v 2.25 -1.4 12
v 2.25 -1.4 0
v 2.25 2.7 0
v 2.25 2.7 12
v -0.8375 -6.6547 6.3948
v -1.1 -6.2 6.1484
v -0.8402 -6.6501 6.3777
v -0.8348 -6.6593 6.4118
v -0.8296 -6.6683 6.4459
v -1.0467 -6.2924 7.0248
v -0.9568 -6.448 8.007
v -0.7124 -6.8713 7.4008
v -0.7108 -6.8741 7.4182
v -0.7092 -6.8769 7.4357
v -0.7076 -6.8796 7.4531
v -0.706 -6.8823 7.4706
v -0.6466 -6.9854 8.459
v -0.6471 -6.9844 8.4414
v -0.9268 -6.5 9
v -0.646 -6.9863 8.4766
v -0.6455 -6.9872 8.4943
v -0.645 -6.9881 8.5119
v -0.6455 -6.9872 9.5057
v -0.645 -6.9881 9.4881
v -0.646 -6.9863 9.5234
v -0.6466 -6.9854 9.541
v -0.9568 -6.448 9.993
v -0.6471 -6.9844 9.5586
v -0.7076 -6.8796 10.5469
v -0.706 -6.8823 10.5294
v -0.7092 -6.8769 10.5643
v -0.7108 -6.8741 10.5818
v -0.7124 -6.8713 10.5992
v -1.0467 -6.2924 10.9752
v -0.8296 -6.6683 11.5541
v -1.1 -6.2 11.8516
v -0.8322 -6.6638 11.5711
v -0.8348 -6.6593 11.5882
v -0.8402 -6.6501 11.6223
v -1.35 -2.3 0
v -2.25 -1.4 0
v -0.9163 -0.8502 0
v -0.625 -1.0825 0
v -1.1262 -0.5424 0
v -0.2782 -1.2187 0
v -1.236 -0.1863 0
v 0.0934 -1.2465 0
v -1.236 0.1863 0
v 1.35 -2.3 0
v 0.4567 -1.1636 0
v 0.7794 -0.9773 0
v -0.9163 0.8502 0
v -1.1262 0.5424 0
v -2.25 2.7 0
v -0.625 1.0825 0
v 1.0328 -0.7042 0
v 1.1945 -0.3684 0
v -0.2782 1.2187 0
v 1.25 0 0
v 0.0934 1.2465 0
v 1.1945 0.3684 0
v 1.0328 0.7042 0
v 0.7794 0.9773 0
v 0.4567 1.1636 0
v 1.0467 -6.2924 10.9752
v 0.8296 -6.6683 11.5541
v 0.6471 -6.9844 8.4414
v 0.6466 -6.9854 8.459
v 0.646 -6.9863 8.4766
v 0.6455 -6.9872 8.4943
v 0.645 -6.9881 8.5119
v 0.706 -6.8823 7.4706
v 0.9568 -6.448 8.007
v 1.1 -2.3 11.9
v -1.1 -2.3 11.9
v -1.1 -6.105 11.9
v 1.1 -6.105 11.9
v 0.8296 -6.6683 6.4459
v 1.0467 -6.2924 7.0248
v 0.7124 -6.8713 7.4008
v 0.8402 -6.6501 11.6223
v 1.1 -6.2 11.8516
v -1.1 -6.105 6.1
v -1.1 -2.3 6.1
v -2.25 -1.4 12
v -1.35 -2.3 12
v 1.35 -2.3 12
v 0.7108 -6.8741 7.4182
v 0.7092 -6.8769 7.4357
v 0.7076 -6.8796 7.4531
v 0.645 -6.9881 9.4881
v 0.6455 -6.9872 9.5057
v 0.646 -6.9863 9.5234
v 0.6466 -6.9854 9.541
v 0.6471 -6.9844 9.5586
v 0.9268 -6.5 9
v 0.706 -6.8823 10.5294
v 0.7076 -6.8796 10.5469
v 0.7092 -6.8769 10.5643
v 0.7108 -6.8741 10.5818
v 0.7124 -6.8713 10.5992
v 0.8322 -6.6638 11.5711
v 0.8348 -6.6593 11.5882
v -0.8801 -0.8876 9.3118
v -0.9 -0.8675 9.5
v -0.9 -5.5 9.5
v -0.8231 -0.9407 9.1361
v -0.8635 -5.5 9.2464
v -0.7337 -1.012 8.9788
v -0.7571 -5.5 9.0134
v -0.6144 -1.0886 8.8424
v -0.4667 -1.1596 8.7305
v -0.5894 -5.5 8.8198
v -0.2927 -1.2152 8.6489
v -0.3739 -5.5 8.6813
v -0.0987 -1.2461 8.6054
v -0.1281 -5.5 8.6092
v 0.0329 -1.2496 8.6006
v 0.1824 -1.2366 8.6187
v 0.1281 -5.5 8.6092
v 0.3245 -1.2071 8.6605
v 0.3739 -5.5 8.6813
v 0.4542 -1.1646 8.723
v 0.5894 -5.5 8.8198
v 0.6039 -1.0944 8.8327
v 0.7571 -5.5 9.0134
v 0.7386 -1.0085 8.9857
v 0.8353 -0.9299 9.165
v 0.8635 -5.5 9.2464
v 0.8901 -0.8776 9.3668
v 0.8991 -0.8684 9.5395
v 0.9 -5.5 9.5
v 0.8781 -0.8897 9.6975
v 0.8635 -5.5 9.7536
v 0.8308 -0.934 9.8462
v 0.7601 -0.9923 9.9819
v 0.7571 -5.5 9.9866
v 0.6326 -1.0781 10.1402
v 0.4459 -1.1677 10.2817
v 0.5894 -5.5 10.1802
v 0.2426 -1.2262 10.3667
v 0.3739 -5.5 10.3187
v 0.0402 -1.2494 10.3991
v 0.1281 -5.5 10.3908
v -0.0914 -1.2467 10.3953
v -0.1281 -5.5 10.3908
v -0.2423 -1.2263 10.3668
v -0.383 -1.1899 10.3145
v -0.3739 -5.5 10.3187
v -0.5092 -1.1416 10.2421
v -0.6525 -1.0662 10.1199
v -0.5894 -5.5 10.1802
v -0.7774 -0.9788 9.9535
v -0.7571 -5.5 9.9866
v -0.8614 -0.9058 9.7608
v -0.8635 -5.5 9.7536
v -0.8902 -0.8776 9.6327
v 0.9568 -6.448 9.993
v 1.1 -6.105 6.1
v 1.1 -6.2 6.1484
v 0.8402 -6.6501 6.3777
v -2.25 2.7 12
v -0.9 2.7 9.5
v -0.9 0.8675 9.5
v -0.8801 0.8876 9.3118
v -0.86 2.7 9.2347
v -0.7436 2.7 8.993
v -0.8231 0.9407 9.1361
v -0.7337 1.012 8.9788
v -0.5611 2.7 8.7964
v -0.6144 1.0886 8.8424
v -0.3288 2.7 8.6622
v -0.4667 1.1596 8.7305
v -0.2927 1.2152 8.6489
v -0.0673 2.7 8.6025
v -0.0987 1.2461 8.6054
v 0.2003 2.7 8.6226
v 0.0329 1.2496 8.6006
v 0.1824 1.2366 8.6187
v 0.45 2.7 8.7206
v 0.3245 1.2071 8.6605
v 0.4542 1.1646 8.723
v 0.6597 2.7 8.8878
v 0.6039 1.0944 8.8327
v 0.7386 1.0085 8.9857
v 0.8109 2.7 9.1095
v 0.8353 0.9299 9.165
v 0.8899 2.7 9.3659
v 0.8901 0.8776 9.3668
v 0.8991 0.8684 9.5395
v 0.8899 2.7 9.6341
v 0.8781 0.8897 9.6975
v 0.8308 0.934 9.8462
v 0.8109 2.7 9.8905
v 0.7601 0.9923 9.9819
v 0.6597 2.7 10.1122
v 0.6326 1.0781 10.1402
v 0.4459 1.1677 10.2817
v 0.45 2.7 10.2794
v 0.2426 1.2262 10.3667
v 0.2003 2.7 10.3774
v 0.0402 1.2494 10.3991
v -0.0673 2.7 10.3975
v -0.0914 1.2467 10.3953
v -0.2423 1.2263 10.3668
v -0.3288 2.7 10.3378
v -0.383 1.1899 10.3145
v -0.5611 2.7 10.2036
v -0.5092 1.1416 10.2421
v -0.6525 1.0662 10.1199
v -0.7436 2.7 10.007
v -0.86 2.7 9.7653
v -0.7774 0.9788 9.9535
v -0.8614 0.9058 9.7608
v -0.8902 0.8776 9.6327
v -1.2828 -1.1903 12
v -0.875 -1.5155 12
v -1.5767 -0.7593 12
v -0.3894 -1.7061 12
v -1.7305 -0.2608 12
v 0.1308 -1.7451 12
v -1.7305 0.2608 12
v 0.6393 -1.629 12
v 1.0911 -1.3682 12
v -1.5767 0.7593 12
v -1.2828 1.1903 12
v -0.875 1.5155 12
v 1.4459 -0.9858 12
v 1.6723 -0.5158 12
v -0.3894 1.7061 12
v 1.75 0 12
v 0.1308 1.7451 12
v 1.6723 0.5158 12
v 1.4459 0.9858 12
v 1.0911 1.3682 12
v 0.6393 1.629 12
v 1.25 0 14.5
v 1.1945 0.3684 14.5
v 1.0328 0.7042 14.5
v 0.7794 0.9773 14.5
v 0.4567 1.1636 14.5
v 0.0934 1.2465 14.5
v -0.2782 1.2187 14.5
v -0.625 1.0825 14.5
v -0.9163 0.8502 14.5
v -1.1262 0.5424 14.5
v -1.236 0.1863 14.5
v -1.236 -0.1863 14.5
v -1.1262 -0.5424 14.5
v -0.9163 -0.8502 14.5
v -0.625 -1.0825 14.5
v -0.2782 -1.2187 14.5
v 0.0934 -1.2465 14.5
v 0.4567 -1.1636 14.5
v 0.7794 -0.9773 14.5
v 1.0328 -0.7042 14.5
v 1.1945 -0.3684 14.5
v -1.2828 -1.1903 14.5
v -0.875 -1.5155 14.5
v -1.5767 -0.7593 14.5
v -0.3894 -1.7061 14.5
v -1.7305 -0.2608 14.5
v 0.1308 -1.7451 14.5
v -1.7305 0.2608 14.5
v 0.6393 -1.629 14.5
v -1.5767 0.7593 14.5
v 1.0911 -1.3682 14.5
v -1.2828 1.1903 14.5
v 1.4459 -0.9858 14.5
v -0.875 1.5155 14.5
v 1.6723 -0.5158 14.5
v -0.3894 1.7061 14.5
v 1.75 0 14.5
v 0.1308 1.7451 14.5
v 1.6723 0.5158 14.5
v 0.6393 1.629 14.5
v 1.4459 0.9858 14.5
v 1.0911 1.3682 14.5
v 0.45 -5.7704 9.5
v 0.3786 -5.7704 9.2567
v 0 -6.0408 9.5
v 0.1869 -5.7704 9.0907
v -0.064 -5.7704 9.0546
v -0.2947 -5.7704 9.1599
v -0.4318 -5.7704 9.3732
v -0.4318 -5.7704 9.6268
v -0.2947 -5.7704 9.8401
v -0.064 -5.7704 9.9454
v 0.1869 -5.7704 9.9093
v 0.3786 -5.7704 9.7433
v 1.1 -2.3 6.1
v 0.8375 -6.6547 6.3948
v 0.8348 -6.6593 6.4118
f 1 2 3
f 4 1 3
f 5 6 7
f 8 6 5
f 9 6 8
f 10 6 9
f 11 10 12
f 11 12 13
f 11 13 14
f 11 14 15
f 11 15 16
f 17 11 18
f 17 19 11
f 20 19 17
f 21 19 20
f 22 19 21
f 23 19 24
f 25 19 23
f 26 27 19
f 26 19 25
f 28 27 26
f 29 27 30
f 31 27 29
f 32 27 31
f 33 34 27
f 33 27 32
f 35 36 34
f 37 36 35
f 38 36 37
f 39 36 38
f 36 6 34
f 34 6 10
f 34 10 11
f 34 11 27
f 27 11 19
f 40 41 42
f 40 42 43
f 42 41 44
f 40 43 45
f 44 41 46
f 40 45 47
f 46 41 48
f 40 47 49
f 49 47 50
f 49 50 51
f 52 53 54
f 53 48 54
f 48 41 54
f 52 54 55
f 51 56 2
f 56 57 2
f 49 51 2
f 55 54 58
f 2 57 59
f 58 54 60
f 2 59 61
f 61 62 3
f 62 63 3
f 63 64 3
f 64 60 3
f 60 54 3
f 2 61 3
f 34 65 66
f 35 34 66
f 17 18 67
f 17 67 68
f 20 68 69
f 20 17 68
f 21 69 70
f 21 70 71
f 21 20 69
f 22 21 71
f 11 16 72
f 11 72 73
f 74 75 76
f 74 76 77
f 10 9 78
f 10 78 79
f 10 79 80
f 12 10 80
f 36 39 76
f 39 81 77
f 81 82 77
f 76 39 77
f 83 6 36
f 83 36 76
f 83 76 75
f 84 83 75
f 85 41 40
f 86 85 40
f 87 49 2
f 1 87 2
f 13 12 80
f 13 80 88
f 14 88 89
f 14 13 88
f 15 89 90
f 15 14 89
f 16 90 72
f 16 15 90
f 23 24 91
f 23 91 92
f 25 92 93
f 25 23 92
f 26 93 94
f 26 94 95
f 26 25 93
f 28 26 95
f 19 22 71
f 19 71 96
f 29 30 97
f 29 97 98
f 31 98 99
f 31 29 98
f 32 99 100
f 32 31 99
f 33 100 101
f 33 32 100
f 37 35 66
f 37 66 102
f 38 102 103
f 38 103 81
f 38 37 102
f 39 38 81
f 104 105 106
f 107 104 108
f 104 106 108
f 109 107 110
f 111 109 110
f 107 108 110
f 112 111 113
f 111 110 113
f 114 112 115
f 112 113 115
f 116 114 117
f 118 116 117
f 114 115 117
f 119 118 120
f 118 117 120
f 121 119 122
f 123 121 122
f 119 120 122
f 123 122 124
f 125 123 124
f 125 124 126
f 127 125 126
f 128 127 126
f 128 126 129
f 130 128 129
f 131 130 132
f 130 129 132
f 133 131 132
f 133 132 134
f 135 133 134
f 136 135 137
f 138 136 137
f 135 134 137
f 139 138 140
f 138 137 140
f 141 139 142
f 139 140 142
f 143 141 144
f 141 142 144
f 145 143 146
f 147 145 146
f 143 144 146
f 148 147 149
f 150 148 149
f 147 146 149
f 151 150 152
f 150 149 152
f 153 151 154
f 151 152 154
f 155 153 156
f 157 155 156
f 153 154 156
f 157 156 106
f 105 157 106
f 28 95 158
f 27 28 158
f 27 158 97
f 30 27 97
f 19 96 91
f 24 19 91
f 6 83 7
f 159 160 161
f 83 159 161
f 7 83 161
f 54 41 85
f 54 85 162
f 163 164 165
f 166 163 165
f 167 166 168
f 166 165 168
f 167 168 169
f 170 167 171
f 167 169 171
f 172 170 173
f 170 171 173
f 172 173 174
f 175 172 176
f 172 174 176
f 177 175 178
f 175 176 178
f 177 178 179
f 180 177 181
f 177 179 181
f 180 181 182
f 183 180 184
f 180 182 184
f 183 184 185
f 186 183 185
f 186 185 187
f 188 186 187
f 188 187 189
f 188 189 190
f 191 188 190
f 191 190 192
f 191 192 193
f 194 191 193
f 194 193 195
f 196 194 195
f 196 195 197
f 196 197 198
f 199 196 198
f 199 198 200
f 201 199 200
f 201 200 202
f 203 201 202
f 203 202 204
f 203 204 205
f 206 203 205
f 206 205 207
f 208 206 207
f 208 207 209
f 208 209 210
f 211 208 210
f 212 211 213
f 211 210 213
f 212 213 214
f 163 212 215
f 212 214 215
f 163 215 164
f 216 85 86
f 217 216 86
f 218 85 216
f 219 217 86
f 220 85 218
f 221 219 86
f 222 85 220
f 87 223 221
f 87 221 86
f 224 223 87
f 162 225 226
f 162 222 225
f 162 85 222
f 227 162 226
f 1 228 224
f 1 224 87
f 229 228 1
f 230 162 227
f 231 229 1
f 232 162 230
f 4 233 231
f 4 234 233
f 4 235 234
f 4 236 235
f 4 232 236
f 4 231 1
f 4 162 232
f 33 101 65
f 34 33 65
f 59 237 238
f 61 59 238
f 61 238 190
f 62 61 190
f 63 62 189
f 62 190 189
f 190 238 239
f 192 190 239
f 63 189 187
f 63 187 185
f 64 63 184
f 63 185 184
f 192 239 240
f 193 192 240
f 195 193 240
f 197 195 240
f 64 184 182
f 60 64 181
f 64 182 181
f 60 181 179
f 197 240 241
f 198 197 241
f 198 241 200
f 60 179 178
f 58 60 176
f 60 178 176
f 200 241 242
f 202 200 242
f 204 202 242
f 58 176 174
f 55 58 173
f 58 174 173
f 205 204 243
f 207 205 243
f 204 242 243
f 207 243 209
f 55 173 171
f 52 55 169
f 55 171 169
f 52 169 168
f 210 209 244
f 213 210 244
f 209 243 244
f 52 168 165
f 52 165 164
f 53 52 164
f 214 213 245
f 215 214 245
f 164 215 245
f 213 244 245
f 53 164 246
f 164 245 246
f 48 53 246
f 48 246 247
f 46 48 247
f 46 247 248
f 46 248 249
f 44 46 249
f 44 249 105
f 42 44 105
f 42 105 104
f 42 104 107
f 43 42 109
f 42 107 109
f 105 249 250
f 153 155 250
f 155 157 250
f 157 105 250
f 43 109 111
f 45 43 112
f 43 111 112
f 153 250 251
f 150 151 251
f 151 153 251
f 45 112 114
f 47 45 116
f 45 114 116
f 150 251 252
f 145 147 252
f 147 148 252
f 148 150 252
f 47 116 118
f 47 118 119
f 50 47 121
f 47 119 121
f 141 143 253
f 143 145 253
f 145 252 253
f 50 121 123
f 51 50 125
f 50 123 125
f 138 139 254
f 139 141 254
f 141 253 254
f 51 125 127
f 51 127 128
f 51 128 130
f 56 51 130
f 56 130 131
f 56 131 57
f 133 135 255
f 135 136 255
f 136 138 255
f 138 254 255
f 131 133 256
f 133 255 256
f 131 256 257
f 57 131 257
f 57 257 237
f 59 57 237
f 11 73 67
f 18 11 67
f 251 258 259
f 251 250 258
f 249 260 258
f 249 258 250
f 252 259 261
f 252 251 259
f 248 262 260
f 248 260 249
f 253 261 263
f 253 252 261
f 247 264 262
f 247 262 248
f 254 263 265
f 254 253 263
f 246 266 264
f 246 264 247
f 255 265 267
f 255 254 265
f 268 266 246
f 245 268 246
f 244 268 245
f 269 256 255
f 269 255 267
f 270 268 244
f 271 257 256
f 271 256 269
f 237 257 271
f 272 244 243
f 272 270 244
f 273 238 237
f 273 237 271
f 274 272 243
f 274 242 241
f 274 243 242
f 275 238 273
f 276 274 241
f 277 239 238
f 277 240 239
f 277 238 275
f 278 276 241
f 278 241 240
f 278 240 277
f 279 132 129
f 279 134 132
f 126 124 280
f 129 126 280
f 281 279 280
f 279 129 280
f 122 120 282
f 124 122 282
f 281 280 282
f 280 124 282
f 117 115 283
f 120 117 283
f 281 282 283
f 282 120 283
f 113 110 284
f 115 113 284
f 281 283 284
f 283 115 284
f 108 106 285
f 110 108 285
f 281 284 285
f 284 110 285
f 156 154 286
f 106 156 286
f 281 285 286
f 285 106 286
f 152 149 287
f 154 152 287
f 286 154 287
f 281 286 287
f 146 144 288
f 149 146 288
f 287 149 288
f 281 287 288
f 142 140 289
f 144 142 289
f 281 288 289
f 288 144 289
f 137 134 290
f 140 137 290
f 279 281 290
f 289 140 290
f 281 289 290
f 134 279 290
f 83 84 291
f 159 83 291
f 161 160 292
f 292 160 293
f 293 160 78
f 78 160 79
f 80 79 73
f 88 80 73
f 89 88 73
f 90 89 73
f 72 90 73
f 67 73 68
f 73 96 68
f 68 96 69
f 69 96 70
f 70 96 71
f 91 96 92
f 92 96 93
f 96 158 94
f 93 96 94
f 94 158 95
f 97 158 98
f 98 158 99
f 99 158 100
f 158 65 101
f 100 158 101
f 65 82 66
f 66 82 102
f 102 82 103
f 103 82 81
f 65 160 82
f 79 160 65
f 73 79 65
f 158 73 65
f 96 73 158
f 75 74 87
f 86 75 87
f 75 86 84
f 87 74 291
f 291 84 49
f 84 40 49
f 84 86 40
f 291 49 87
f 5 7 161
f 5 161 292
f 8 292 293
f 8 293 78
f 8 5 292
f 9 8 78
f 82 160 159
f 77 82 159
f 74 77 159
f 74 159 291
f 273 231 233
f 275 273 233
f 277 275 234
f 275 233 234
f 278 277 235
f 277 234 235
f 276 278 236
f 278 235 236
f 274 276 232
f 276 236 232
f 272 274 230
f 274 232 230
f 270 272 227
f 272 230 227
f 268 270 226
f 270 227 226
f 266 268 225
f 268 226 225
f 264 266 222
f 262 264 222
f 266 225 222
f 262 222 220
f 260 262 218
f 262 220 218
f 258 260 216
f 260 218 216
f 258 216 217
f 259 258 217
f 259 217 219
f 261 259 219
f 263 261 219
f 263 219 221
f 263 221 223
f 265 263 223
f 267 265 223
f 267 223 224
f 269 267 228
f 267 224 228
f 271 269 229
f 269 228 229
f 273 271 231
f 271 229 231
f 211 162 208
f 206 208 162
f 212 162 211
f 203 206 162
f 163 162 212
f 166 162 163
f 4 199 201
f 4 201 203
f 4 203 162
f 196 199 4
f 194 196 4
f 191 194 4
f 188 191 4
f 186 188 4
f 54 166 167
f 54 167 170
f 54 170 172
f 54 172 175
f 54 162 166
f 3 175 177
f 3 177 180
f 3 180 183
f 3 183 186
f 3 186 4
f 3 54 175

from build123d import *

# Parameters (mm, degrees)
SKETCH1_W                      = 4.5
SKETCH1_H                      = 5
BOSS_EXTRUDE1_DEPTH            = 12
SKETCH4_R                      = 1.75
BOSS_EXTRUDE3_DEPTH            = 2.5
SKETCH5_R                      = 1.25
CUT_EXTRUDE1_DEPTH             = 15.5
SKETCH7_W                      = 2.2
SKETCH7_H                      = 4.7
BOSS_EXTRUDE4_DEPTH            = 5.8
CUT_EXTRUDE2_DEPTH             = 13
CUT_EXTRUDE6_DEPTH             = 12.9
CUT_EXTRUDE3_DEPTH             = 3.25
CUT_EXTRUDE3_DEPTH_BACK        = 3.25
CUT_EXTRUDE4_DEPTH             = 3.25
CIRPATTERN3_COUNT              = 60
F_1_8_1_8_DIAMETER_HOLE1_D     = 1.8
F_1_8_1_8_DIAMETER_HOLE1_DEPTH = 8.2
F_1_8_1_8_DIAMETER_HOLE1_TIP   = 0.540774557


with BuildPart() as part:
    # Sketch1 → Boss-Extrude1 (new body)
    with BuildSketch(Plane.XY):
        with Locations((0, 0.2)):
            Rectangle(SKETCH1_W, SKETCH1_H)
    extrude(amount=BOSS_EXTRUDE1_DEPTH)

    # Sketch4 → Boss-Extrude3 (add)
    with BuildSketch(Plane.XY.offset(12)):
        Circle(SKETCH4_R)
    extrude(amount=BOSS_EXTRUDE3_DEPTH)

    # Sketch5 → Cut-Extrude1 (cut, through all)
    with BuildSketch(Plane.XY.offset(14.5)):
        Circle(SKETCH5_R)
    extrude(amount=-CUT_EXTRUDE1_DEPTH, mode=Mode.SUBTRACT)

    # Sketch7 → Boss-Extrude4 (add)
    with BuildSketch(Plane.XY.offset(6.1)):
        with Locations((0, -4.65)):
            Rectangle(SKETCH7_W, SKETCH7_H)
    extrude(amount=BOSS_EXTRUDE4_DEPTH)

    # Sketch8 → Cut-Extrude2 (cut, through all)
    with BuildSketch(Plane.XY.offset(12)):
        Polygon((1.35, -2.3), (2.25, -1.4), (2.25, -2.3), align=None)
        Polygon((-1.35, -2.3), (-2.25, -2.3), (-2.25, -1.4), align=None)
    extrude(amount=-CUT_EXTRUDE2_DEPTH, mode=Mode.SUBTRACT)

    # Sketch10 → Cut-Extrude6 (cut, through all)
    with BuildSketch(Plane.XY.offset(11.9)):
        Polygon((-0.638119785, -7), (-1.1, -7), (-1.1, -6.2), align=None)
        Polygon((1.1, -7), (1.1, -6.2), (0.638119785, -7), align=None)
    extrude(amount=-CUT_EXTRUDE6_DEPTH, mode=Mode.SUBTRACT)

    # Sketch9 → Cut-Extrude3 (cut, two sides)
    with BuildSketch(Plane(origin=(0, 0, 0), x_dir=(0, 0, -1), z_dir=(1, 0, 0))) as cut_extrude3_sk:
        with BuildLine():
            Line((-11.9, -6.570266454), (-11.9, -8))
            Line((-11.9, -8), (-6.1, -8))
            Line((-6.1, -8), (-6.1, -6.570266454))
            ThreePointArc((-6.1, -6.570266454), (-9, -7), (-11.9, -6.570266454))
        make_face()
    extrude(amount=CUT_EXTRUDE3_DEPTH, mode=Mode.SUBTRACT)
    extrude(cut_extrude3_sk.sketch, amount=-CUT_EXTRUDE3_DEPTH_BACK, mode=Mode.SUBTRACT)

    # Sketch9<3> → Cut-Extrude4 (cut, symmetric)
    with BuildSketch(Plane(origin=(0, 0, 0), x_dir=(0, 0, -1), z_dir=(1, 0, 0))):
        with BuildLine():
            Line((-8.51191829, -6.98808171), (-9, -6.5))
            Line((-9, -6.5), (-9.48808171, -6.98808171))
            ThreePointArc((-9.48808171, -6.98808171), (-9, -7), (-8.51191829, -6.98808171))
        make_face()
    cut_extrude4 = extrude(amount=CUT_EXTRUDE4_DEPTH, both=True, mode=Mode.SUBTRACT)

    # CirPattern3: Cut-Extrude4 ×60 about axis, 6 skipped
    cirpattern3_axis = Axis((0, 3, 9), (1, 0, 0))
    add([cut_extrude4.rotate(cirpattern3_axis, i * 360 / CIRPATTERN3_COUNT) for i in range(1, CIRPATTERN3_COUNT) if i not in (8, 9, 10, 11, 12, 13)], mode=Mode.SUBTRACT)

    # Ø1.8 (1.8) Diameter Hole1
    with Locations(Plane(origin=(0, 2.7, 0), x_dir=(1, 0, 0), z_dir=(0, 1, 0))):
        with Locations((0, -9.5)):
            Hole(F_1_8_1_8_DIAMETER_HOLE1_D / 2, depth=F_1_8_1_8_DIAMETER_HOLE1_DEPTH)
            with Locations((0, 0, -(F_1_8_1_8_DIAMETER_HOLE1_DEPTH + F_1_8_1_8_DIAMETER_HOLE1_TIP / 2))):  # 118° drill point
                Cone(0, F_1_8_1_8_DIAMETER_HOLE1_D / 2, F_1_8_1_8_DIAMETER_HOLE1_TIP, mode=Mode.SUBTRACT)


solid = part.part
